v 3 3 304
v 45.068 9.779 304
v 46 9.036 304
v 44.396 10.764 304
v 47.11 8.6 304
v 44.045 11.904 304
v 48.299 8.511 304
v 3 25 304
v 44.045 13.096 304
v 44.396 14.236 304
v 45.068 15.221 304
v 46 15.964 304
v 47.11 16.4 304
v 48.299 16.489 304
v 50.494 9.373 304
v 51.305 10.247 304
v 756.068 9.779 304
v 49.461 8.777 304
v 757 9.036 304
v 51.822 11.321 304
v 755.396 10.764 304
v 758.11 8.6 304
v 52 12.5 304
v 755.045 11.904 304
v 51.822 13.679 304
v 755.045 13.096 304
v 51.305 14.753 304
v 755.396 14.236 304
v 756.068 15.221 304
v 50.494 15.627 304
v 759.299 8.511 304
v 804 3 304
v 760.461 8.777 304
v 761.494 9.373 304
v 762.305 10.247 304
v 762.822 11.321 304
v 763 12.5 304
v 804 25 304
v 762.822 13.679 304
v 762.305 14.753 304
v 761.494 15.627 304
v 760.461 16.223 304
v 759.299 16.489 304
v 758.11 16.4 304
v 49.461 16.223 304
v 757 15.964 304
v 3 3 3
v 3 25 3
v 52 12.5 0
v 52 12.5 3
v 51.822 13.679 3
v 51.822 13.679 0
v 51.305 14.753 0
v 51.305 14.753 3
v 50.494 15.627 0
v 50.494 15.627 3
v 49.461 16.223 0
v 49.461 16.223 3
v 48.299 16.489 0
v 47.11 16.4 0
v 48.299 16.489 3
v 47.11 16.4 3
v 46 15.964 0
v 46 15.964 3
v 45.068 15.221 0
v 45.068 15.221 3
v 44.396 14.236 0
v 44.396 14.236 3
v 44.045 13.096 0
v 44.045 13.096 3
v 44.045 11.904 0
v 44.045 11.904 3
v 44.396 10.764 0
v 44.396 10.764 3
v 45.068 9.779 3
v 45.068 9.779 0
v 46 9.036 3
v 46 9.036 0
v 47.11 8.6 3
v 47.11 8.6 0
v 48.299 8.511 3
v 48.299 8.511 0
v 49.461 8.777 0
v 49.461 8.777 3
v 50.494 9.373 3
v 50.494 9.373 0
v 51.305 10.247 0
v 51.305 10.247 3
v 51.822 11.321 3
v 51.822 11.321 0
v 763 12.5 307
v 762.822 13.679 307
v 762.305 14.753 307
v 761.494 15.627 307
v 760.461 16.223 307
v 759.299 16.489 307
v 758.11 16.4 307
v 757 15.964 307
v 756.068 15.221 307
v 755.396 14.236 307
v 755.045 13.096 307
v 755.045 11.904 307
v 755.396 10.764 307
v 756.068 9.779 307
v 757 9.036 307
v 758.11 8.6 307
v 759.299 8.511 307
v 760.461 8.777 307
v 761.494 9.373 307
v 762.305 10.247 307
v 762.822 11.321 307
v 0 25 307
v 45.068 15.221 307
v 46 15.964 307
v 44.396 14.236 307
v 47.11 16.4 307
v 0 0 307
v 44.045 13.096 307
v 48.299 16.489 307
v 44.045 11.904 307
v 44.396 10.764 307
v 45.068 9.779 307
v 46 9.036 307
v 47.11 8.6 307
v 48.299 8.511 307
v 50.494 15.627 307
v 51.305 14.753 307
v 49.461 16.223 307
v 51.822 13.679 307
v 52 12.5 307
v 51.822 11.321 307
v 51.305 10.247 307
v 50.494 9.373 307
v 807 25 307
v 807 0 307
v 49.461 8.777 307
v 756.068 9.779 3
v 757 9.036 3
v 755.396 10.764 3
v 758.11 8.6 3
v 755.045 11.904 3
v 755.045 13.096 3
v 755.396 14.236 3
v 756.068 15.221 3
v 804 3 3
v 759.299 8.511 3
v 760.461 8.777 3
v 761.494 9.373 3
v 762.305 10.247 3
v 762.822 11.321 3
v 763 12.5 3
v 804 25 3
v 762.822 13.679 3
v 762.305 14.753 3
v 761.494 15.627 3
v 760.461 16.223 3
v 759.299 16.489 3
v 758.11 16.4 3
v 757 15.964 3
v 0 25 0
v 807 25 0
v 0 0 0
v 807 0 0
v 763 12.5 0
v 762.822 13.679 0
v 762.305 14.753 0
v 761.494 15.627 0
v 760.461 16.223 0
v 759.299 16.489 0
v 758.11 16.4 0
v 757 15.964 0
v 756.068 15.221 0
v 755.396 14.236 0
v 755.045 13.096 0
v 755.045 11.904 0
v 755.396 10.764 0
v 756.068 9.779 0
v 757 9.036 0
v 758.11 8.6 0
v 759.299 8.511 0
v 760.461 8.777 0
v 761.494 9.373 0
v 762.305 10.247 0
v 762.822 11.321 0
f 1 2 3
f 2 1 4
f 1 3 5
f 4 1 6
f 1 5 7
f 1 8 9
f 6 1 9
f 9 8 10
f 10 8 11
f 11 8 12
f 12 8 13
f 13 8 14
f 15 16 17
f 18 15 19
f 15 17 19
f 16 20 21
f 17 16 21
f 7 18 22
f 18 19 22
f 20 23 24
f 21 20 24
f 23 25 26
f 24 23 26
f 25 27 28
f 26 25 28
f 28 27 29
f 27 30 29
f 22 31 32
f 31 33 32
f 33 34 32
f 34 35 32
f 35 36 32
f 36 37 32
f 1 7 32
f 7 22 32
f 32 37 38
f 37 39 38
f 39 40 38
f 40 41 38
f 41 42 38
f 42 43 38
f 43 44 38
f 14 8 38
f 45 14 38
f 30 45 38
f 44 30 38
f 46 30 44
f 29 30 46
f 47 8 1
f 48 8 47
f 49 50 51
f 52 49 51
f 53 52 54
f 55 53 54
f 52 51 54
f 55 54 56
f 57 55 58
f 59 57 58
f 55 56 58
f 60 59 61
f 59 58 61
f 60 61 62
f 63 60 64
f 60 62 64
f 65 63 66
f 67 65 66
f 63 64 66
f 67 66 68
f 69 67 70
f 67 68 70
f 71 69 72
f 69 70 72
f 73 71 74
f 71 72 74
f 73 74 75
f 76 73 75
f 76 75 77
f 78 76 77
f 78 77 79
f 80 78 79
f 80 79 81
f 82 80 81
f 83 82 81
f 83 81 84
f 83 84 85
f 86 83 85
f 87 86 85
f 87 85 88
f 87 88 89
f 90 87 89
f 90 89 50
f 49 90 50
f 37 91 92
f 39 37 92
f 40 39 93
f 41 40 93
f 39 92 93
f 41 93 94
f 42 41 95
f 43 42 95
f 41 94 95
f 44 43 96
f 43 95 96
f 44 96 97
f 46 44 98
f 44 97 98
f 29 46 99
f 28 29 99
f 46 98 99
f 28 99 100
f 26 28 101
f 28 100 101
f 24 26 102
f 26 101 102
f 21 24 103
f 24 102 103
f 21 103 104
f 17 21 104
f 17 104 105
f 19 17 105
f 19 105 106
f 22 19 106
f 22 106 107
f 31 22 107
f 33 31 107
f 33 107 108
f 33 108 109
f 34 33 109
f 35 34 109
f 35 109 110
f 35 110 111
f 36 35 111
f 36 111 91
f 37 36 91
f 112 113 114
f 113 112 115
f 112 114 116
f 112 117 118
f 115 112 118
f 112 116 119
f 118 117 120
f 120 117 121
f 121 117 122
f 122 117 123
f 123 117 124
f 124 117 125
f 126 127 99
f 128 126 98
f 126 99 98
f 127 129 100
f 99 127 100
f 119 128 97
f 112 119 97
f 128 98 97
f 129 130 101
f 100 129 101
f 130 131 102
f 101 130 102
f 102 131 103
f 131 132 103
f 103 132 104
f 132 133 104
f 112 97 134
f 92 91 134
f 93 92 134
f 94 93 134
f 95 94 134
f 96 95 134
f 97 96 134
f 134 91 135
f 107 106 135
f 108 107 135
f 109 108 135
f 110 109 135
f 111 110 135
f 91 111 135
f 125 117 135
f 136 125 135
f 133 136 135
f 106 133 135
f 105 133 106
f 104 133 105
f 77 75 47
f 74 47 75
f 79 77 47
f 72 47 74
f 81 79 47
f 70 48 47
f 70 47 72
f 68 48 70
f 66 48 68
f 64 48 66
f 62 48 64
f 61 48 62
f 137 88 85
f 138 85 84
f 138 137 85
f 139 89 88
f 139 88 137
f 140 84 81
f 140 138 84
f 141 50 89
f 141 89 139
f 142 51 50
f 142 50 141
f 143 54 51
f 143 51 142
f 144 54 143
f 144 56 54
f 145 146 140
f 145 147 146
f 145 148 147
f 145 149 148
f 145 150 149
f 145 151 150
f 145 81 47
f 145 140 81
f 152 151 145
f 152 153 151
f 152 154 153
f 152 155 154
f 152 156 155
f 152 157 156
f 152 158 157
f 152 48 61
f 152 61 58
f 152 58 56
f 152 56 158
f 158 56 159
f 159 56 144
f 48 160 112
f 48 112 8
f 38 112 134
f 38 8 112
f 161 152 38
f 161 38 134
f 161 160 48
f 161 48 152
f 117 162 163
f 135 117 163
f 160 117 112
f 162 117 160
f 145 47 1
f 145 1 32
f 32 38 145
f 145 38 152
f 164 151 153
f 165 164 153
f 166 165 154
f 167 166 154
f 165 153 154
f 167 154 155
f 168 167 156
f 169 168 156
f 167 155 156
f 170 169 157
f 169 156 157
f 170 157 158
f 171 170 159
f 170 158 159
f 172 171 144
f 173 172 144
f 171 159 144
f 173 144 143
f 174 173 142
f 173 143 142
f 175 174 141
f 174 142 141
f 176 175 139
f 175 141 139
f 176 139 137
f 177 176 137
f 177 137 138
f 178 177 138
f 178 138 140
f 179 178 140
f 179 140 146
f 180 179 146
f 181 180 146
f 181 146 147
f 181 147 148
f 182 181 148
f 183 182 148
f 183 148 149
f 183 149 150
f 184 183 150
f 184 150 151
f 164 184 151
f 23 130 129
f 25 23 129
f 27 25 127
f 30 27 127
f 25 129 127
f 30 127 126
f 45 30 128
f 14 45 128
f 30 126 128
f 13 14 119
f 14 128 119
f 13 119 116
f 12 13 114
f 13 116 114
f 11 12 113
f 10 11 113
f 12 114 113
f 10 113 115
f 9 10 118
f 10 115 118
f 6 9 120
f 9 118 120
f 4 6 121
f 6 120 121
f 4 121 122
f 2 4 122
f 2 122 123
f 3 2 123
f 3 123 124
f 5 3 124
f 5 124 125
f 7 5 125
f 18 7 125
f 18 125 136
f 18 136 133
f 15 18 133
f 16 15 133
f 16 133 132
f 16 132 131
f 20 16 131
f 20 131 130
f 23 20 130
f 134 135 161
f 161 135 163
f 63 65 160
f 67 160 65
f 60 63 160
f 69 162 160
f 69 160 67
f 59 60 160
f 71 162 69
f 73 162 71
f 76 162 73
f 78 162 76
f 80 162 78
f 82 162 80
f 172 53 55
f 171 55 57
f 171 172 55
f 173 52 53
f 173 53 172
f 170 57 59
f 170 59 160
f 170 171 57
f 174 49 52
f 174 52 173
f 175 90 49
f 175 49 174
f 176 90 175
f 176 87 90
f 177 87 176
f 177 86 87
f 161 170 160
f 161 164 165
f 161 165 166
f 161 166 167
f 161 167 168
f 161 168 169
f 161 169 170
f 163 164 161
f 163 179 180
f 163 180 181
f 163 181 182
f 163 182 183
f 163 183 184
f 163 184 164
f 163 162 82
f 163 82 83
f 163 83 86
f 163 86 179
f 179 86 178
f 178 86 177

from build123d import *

# Parameters (mm, degrees)
SKETCH_2_W          = 807
SKETCH_2_H          = 307
EXTRUDE_1_DEPTH     = 25
SKETCH_3_W          = 801
SKETCH_3_H          = 301
CUT_EXTRUDE_1_DEPTH = 22
SKETCH_4_R          = 4
CUT_EXTRUDE_2_DEPTH = 308


with BuildPart() as part:
    # 草圖2 → 填料-伸長1 (new body)
    with BuildSketch(Plane(origin=(0, 0, 0), x_dir=(1, 0, 0), z_dir=(0, 1, 0))):
        with Locations((403.5, -153.5)):
            Rectangle(SKETCH_2_W, SKETCH_2_H)
    extrude(amount=EXTRUDE_1_DEPTH)

    # 草圖3 → 除料-伸長1 (cut)
    with BuildSketch(Plane(origin=(0, 25, 0), x_dir=(1, 0, 0), z_dir=(0, 1, 0))):
        with Locations((403.5, -153.5)):
            Rectangle(SKETCH_3_W, SKETCH_3_H)
    extrude(amount=-CUT_EXTRUDE_1_DEPTH, mode=Mode.SUBTRACT)

    # 草圖4 → 除料-伸長2 (cut, through all)
    with BuildSketch(Plane.XY.offset(307)):
        with Locations((759, 12.5)):
            Circle(SKETCH_4_R)
        with Locations((48, 12.5)):
            Circle(SKETCH_4_R)
    extrude(amount=-CUT_EXTRUDE_2_DEPTH, mode=Mode.SUBTRACT)


solid = part.part
